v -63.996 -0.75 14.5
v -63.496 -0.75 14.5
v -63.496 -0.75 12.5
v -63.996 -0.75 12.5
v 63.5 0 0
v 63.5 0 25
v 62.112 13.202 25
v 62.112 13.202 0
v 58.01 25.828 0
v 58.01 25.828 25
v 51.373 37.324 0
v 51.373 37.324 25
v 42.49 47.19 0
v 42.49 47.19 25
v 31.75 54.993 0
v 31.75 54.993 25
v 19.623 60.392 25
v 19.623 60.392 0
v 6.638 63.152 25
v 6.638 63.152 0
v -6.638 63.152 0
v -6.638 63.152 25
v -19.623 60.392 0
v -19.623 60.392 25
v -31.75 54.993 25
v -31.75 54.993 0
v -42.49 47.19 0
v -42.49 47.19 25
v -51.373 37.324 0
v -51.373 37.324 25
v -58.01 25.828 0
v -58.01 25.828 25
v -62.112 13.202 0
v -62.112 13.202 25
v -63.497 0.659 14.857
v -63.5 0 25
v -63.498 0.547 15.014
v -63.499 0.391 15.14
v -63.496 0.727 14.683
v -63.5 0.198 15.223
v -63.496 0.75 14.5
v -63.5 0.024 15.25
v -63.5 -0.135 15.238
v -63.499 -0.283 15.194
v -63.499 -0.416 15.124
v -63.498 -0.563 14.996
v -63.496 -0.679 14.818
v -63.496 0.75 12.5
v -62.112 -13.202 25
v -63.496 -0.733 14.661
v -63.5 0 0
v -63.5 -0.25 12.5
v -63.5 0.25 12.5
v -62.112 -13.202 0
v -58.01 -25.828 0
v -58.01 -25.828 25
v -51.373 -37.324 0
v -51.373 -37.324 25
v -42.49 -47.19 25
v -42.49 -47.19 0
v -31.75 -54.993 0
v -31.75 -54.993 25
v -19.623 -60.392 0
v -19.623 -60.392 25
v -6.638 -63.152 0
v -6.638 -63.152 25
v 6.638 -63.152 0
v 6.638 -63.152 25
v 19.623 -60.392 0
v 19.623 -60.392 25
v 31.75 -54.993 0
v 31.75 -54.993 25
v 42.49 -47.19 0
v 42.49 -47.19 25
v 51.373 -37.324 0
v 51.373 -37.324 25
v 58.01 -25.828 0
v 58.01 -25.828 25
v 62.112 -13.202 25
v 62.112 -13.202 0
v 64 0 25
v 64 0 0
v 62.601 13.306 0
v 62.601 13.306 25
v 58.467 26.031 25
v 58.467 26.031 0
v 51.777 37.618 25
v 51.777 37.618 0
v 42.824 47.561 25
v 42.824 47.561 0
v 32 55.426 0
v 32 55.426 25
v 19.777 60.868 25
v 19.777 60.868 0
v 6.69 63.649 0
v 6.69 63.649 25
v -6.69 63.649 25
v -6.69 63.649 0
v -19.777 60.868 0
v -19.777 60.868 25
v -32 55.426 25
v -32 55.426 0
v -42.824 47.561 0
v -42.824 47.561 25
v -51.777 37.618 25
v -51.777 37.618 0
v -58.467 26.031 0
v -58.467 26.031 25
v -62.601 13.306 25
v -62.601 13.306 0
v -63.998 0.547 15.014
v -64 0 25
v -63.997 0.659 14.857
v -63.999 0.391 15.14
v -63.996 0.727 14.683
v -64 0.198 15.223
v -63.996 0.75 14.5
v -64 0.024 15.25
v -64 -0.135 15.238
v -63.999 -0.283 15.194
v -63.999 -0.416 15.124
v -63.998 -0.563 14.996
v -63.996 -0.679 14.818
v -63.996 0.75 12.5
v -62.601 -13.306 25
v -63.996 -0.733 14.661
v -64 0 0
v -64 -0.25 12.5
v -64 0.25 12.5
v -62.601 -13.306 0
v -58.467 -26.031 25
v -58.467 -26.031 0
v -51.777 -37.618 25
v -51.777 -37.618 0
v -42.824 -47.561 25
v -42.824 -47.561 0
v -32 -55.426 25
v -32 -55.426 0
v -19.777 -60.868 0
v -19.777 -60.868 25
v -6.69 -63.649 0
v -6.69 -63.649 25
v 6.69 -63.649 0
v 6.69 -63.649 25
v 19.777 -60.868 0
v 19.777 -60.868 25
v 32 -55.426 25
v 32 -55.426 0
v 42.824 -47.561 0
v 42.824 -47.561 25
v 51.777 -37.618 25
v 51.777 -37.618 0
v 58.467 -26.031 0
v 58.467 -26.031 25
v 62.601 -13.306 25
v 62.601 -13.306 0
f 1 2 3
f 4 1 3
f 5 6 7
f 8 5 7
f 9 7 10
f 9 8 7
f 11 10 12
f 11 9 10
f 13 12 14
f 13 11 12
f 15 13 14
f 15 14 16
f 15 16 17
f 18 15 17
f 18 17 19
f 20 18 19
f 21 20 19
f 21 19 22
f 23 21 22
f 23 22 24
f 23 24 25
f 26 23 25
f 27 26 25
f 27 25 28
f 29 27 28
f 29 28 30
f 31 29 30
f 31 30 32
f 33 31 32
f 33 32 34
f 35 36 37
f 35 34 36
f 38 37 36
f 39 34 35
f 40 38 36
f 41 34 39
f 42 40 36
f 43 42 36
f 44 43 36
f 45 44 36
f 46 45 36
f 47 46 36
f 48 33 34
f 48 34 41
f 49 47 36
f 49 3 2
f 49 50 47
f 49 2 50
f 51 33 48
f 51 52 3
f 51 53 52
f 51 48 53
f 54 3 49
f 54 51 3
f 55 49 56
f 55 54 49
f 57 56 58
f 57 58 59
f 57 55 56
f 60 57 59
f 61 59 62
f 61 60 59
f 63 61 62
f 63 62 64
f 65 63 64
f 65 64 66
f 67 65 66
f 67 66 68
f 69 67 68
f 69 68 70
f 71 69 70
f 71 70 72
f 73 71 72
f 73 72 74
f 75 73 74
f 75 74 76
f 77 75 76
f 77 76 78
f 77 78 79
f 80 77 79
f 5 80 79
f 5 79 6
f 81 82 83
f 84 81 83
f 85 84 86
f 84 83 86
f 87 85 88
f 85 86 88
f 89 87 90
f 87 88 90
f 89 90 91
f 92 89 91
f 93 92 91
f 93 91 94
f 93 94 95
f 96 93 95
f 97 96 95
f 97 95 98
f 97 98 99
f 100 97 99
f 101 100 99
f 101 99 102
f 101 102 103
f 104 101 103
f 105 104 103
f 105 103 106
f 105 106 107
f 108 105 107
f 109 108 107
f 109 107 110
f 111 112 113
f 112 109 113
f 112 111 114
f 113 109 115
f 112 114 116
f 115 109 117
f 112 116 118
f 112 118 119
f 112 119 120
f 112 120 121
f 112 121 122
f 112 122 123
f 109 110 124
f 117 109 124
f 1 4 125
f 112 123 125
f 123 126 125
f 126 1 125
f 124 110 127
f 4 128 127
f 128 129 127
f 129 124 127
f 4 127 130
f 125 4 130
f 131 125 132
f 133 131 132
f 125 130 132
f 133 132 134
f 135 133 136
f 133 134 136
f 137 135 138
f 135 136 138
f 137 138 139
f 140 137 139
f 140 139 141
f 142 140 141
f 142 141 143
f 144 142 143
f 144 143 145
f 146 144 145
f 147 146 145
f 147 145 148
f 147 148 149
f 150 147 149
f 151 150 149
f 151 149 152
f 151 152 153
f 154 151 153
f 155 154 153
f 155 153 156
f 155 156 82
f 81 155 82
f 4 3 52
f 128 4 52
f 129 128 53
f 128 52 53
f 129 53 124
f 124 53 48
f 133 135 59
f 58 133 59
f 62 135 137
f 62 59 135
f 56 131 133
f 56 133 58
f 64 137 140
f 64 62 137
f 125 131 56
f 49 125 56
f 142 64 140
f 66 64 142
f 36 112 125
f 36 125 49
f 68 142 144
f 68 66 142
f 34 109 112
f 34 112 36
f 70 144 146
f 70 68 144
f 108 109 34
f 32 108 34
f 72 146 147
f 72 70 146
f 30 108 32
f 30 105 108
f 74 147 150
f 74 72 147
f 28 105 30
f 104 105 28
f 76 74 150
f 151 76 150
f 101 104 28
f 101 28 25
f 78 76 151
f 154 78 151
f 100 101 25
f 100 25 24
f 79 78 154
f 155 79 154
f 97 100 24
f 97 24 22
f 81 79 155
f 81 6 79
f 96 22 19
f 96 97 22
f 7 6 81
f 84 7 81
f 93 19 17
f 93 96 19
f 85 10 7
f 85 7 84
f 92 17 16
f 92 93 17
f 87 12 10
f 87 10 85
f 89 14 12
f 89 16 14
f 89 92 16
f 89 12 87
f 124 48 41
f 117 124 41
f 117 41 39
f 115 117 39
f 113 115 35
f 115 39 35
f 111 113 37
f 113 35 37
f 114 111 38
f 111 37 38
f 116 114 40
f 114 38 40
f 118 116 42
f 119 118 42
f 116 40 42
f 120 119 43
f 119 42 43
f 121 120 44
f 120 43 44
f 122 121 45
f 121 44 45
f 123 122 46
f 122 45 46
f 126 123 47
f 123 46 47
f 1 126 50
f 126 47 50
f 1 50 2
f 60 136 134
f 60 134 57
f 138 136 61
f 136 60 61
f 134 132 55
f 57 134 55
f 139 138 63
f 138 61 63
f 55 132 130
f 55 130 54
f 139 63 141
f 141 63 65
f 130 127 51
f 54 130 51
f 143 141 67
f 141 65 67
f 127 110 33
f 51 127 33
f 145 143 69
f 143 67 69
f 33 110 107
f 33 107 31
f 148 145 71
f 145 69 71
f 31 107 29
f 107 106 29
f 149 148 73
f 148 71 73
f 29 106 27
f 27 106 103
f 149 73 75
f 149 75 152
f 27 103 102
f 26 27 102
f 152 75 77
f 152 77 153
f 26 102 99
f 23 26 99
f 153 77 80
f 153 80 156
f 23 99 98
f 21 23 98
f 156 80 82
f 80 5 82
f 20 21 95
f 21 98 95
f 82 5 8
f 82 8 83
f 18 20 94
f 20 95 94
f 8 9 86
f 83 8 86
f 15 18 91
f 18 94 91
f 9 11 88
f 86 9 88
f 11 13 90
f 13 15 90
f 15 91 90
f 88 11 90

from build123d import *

# Parameters (mm, degrees)
SKETCH_1_R          = 64
SKETCH_1_R_2        = 63.5
EXTRUDE_1_DEPTH     = 25
CUT_EXTRUDE_1_DEPTH = 2000


with BuildPart() as part:
    # 草图1 → 凸台-拉伸1 (new body)
    with BuildSketch(Plane.XY):
        Circle(SKETCH_1_R)
        Circle(SKETCH_1_R_2, mode=Mode.SUBTRACT)
    extrude(amount=EXTRUDE_1_DEPTH)

    # 草图2 → 切除-拉伸1 (cut)
    with BuildSketch(Plane(origin=(0, 0, 0), x_dir=(0, 0, -1), z_dir=(1, 0, 0))):
        with BuildLine():
            Line((-14.5, -0.75), (-12.5, -0.75))
            Line((-12.5, -0.75), (-12.5, 0.75))
            Line((-12.5, 0.75), (-14.5, 0.75))
            ThreePointArc((-14.5, 0.75), (-15.25, 0), (-14.5, -0.75))
        make_face()
    extrude(amount=-CUT_EXTRUDE_1_DEPTH, mode=Mode.SUBTRACT)


solid = part.part
